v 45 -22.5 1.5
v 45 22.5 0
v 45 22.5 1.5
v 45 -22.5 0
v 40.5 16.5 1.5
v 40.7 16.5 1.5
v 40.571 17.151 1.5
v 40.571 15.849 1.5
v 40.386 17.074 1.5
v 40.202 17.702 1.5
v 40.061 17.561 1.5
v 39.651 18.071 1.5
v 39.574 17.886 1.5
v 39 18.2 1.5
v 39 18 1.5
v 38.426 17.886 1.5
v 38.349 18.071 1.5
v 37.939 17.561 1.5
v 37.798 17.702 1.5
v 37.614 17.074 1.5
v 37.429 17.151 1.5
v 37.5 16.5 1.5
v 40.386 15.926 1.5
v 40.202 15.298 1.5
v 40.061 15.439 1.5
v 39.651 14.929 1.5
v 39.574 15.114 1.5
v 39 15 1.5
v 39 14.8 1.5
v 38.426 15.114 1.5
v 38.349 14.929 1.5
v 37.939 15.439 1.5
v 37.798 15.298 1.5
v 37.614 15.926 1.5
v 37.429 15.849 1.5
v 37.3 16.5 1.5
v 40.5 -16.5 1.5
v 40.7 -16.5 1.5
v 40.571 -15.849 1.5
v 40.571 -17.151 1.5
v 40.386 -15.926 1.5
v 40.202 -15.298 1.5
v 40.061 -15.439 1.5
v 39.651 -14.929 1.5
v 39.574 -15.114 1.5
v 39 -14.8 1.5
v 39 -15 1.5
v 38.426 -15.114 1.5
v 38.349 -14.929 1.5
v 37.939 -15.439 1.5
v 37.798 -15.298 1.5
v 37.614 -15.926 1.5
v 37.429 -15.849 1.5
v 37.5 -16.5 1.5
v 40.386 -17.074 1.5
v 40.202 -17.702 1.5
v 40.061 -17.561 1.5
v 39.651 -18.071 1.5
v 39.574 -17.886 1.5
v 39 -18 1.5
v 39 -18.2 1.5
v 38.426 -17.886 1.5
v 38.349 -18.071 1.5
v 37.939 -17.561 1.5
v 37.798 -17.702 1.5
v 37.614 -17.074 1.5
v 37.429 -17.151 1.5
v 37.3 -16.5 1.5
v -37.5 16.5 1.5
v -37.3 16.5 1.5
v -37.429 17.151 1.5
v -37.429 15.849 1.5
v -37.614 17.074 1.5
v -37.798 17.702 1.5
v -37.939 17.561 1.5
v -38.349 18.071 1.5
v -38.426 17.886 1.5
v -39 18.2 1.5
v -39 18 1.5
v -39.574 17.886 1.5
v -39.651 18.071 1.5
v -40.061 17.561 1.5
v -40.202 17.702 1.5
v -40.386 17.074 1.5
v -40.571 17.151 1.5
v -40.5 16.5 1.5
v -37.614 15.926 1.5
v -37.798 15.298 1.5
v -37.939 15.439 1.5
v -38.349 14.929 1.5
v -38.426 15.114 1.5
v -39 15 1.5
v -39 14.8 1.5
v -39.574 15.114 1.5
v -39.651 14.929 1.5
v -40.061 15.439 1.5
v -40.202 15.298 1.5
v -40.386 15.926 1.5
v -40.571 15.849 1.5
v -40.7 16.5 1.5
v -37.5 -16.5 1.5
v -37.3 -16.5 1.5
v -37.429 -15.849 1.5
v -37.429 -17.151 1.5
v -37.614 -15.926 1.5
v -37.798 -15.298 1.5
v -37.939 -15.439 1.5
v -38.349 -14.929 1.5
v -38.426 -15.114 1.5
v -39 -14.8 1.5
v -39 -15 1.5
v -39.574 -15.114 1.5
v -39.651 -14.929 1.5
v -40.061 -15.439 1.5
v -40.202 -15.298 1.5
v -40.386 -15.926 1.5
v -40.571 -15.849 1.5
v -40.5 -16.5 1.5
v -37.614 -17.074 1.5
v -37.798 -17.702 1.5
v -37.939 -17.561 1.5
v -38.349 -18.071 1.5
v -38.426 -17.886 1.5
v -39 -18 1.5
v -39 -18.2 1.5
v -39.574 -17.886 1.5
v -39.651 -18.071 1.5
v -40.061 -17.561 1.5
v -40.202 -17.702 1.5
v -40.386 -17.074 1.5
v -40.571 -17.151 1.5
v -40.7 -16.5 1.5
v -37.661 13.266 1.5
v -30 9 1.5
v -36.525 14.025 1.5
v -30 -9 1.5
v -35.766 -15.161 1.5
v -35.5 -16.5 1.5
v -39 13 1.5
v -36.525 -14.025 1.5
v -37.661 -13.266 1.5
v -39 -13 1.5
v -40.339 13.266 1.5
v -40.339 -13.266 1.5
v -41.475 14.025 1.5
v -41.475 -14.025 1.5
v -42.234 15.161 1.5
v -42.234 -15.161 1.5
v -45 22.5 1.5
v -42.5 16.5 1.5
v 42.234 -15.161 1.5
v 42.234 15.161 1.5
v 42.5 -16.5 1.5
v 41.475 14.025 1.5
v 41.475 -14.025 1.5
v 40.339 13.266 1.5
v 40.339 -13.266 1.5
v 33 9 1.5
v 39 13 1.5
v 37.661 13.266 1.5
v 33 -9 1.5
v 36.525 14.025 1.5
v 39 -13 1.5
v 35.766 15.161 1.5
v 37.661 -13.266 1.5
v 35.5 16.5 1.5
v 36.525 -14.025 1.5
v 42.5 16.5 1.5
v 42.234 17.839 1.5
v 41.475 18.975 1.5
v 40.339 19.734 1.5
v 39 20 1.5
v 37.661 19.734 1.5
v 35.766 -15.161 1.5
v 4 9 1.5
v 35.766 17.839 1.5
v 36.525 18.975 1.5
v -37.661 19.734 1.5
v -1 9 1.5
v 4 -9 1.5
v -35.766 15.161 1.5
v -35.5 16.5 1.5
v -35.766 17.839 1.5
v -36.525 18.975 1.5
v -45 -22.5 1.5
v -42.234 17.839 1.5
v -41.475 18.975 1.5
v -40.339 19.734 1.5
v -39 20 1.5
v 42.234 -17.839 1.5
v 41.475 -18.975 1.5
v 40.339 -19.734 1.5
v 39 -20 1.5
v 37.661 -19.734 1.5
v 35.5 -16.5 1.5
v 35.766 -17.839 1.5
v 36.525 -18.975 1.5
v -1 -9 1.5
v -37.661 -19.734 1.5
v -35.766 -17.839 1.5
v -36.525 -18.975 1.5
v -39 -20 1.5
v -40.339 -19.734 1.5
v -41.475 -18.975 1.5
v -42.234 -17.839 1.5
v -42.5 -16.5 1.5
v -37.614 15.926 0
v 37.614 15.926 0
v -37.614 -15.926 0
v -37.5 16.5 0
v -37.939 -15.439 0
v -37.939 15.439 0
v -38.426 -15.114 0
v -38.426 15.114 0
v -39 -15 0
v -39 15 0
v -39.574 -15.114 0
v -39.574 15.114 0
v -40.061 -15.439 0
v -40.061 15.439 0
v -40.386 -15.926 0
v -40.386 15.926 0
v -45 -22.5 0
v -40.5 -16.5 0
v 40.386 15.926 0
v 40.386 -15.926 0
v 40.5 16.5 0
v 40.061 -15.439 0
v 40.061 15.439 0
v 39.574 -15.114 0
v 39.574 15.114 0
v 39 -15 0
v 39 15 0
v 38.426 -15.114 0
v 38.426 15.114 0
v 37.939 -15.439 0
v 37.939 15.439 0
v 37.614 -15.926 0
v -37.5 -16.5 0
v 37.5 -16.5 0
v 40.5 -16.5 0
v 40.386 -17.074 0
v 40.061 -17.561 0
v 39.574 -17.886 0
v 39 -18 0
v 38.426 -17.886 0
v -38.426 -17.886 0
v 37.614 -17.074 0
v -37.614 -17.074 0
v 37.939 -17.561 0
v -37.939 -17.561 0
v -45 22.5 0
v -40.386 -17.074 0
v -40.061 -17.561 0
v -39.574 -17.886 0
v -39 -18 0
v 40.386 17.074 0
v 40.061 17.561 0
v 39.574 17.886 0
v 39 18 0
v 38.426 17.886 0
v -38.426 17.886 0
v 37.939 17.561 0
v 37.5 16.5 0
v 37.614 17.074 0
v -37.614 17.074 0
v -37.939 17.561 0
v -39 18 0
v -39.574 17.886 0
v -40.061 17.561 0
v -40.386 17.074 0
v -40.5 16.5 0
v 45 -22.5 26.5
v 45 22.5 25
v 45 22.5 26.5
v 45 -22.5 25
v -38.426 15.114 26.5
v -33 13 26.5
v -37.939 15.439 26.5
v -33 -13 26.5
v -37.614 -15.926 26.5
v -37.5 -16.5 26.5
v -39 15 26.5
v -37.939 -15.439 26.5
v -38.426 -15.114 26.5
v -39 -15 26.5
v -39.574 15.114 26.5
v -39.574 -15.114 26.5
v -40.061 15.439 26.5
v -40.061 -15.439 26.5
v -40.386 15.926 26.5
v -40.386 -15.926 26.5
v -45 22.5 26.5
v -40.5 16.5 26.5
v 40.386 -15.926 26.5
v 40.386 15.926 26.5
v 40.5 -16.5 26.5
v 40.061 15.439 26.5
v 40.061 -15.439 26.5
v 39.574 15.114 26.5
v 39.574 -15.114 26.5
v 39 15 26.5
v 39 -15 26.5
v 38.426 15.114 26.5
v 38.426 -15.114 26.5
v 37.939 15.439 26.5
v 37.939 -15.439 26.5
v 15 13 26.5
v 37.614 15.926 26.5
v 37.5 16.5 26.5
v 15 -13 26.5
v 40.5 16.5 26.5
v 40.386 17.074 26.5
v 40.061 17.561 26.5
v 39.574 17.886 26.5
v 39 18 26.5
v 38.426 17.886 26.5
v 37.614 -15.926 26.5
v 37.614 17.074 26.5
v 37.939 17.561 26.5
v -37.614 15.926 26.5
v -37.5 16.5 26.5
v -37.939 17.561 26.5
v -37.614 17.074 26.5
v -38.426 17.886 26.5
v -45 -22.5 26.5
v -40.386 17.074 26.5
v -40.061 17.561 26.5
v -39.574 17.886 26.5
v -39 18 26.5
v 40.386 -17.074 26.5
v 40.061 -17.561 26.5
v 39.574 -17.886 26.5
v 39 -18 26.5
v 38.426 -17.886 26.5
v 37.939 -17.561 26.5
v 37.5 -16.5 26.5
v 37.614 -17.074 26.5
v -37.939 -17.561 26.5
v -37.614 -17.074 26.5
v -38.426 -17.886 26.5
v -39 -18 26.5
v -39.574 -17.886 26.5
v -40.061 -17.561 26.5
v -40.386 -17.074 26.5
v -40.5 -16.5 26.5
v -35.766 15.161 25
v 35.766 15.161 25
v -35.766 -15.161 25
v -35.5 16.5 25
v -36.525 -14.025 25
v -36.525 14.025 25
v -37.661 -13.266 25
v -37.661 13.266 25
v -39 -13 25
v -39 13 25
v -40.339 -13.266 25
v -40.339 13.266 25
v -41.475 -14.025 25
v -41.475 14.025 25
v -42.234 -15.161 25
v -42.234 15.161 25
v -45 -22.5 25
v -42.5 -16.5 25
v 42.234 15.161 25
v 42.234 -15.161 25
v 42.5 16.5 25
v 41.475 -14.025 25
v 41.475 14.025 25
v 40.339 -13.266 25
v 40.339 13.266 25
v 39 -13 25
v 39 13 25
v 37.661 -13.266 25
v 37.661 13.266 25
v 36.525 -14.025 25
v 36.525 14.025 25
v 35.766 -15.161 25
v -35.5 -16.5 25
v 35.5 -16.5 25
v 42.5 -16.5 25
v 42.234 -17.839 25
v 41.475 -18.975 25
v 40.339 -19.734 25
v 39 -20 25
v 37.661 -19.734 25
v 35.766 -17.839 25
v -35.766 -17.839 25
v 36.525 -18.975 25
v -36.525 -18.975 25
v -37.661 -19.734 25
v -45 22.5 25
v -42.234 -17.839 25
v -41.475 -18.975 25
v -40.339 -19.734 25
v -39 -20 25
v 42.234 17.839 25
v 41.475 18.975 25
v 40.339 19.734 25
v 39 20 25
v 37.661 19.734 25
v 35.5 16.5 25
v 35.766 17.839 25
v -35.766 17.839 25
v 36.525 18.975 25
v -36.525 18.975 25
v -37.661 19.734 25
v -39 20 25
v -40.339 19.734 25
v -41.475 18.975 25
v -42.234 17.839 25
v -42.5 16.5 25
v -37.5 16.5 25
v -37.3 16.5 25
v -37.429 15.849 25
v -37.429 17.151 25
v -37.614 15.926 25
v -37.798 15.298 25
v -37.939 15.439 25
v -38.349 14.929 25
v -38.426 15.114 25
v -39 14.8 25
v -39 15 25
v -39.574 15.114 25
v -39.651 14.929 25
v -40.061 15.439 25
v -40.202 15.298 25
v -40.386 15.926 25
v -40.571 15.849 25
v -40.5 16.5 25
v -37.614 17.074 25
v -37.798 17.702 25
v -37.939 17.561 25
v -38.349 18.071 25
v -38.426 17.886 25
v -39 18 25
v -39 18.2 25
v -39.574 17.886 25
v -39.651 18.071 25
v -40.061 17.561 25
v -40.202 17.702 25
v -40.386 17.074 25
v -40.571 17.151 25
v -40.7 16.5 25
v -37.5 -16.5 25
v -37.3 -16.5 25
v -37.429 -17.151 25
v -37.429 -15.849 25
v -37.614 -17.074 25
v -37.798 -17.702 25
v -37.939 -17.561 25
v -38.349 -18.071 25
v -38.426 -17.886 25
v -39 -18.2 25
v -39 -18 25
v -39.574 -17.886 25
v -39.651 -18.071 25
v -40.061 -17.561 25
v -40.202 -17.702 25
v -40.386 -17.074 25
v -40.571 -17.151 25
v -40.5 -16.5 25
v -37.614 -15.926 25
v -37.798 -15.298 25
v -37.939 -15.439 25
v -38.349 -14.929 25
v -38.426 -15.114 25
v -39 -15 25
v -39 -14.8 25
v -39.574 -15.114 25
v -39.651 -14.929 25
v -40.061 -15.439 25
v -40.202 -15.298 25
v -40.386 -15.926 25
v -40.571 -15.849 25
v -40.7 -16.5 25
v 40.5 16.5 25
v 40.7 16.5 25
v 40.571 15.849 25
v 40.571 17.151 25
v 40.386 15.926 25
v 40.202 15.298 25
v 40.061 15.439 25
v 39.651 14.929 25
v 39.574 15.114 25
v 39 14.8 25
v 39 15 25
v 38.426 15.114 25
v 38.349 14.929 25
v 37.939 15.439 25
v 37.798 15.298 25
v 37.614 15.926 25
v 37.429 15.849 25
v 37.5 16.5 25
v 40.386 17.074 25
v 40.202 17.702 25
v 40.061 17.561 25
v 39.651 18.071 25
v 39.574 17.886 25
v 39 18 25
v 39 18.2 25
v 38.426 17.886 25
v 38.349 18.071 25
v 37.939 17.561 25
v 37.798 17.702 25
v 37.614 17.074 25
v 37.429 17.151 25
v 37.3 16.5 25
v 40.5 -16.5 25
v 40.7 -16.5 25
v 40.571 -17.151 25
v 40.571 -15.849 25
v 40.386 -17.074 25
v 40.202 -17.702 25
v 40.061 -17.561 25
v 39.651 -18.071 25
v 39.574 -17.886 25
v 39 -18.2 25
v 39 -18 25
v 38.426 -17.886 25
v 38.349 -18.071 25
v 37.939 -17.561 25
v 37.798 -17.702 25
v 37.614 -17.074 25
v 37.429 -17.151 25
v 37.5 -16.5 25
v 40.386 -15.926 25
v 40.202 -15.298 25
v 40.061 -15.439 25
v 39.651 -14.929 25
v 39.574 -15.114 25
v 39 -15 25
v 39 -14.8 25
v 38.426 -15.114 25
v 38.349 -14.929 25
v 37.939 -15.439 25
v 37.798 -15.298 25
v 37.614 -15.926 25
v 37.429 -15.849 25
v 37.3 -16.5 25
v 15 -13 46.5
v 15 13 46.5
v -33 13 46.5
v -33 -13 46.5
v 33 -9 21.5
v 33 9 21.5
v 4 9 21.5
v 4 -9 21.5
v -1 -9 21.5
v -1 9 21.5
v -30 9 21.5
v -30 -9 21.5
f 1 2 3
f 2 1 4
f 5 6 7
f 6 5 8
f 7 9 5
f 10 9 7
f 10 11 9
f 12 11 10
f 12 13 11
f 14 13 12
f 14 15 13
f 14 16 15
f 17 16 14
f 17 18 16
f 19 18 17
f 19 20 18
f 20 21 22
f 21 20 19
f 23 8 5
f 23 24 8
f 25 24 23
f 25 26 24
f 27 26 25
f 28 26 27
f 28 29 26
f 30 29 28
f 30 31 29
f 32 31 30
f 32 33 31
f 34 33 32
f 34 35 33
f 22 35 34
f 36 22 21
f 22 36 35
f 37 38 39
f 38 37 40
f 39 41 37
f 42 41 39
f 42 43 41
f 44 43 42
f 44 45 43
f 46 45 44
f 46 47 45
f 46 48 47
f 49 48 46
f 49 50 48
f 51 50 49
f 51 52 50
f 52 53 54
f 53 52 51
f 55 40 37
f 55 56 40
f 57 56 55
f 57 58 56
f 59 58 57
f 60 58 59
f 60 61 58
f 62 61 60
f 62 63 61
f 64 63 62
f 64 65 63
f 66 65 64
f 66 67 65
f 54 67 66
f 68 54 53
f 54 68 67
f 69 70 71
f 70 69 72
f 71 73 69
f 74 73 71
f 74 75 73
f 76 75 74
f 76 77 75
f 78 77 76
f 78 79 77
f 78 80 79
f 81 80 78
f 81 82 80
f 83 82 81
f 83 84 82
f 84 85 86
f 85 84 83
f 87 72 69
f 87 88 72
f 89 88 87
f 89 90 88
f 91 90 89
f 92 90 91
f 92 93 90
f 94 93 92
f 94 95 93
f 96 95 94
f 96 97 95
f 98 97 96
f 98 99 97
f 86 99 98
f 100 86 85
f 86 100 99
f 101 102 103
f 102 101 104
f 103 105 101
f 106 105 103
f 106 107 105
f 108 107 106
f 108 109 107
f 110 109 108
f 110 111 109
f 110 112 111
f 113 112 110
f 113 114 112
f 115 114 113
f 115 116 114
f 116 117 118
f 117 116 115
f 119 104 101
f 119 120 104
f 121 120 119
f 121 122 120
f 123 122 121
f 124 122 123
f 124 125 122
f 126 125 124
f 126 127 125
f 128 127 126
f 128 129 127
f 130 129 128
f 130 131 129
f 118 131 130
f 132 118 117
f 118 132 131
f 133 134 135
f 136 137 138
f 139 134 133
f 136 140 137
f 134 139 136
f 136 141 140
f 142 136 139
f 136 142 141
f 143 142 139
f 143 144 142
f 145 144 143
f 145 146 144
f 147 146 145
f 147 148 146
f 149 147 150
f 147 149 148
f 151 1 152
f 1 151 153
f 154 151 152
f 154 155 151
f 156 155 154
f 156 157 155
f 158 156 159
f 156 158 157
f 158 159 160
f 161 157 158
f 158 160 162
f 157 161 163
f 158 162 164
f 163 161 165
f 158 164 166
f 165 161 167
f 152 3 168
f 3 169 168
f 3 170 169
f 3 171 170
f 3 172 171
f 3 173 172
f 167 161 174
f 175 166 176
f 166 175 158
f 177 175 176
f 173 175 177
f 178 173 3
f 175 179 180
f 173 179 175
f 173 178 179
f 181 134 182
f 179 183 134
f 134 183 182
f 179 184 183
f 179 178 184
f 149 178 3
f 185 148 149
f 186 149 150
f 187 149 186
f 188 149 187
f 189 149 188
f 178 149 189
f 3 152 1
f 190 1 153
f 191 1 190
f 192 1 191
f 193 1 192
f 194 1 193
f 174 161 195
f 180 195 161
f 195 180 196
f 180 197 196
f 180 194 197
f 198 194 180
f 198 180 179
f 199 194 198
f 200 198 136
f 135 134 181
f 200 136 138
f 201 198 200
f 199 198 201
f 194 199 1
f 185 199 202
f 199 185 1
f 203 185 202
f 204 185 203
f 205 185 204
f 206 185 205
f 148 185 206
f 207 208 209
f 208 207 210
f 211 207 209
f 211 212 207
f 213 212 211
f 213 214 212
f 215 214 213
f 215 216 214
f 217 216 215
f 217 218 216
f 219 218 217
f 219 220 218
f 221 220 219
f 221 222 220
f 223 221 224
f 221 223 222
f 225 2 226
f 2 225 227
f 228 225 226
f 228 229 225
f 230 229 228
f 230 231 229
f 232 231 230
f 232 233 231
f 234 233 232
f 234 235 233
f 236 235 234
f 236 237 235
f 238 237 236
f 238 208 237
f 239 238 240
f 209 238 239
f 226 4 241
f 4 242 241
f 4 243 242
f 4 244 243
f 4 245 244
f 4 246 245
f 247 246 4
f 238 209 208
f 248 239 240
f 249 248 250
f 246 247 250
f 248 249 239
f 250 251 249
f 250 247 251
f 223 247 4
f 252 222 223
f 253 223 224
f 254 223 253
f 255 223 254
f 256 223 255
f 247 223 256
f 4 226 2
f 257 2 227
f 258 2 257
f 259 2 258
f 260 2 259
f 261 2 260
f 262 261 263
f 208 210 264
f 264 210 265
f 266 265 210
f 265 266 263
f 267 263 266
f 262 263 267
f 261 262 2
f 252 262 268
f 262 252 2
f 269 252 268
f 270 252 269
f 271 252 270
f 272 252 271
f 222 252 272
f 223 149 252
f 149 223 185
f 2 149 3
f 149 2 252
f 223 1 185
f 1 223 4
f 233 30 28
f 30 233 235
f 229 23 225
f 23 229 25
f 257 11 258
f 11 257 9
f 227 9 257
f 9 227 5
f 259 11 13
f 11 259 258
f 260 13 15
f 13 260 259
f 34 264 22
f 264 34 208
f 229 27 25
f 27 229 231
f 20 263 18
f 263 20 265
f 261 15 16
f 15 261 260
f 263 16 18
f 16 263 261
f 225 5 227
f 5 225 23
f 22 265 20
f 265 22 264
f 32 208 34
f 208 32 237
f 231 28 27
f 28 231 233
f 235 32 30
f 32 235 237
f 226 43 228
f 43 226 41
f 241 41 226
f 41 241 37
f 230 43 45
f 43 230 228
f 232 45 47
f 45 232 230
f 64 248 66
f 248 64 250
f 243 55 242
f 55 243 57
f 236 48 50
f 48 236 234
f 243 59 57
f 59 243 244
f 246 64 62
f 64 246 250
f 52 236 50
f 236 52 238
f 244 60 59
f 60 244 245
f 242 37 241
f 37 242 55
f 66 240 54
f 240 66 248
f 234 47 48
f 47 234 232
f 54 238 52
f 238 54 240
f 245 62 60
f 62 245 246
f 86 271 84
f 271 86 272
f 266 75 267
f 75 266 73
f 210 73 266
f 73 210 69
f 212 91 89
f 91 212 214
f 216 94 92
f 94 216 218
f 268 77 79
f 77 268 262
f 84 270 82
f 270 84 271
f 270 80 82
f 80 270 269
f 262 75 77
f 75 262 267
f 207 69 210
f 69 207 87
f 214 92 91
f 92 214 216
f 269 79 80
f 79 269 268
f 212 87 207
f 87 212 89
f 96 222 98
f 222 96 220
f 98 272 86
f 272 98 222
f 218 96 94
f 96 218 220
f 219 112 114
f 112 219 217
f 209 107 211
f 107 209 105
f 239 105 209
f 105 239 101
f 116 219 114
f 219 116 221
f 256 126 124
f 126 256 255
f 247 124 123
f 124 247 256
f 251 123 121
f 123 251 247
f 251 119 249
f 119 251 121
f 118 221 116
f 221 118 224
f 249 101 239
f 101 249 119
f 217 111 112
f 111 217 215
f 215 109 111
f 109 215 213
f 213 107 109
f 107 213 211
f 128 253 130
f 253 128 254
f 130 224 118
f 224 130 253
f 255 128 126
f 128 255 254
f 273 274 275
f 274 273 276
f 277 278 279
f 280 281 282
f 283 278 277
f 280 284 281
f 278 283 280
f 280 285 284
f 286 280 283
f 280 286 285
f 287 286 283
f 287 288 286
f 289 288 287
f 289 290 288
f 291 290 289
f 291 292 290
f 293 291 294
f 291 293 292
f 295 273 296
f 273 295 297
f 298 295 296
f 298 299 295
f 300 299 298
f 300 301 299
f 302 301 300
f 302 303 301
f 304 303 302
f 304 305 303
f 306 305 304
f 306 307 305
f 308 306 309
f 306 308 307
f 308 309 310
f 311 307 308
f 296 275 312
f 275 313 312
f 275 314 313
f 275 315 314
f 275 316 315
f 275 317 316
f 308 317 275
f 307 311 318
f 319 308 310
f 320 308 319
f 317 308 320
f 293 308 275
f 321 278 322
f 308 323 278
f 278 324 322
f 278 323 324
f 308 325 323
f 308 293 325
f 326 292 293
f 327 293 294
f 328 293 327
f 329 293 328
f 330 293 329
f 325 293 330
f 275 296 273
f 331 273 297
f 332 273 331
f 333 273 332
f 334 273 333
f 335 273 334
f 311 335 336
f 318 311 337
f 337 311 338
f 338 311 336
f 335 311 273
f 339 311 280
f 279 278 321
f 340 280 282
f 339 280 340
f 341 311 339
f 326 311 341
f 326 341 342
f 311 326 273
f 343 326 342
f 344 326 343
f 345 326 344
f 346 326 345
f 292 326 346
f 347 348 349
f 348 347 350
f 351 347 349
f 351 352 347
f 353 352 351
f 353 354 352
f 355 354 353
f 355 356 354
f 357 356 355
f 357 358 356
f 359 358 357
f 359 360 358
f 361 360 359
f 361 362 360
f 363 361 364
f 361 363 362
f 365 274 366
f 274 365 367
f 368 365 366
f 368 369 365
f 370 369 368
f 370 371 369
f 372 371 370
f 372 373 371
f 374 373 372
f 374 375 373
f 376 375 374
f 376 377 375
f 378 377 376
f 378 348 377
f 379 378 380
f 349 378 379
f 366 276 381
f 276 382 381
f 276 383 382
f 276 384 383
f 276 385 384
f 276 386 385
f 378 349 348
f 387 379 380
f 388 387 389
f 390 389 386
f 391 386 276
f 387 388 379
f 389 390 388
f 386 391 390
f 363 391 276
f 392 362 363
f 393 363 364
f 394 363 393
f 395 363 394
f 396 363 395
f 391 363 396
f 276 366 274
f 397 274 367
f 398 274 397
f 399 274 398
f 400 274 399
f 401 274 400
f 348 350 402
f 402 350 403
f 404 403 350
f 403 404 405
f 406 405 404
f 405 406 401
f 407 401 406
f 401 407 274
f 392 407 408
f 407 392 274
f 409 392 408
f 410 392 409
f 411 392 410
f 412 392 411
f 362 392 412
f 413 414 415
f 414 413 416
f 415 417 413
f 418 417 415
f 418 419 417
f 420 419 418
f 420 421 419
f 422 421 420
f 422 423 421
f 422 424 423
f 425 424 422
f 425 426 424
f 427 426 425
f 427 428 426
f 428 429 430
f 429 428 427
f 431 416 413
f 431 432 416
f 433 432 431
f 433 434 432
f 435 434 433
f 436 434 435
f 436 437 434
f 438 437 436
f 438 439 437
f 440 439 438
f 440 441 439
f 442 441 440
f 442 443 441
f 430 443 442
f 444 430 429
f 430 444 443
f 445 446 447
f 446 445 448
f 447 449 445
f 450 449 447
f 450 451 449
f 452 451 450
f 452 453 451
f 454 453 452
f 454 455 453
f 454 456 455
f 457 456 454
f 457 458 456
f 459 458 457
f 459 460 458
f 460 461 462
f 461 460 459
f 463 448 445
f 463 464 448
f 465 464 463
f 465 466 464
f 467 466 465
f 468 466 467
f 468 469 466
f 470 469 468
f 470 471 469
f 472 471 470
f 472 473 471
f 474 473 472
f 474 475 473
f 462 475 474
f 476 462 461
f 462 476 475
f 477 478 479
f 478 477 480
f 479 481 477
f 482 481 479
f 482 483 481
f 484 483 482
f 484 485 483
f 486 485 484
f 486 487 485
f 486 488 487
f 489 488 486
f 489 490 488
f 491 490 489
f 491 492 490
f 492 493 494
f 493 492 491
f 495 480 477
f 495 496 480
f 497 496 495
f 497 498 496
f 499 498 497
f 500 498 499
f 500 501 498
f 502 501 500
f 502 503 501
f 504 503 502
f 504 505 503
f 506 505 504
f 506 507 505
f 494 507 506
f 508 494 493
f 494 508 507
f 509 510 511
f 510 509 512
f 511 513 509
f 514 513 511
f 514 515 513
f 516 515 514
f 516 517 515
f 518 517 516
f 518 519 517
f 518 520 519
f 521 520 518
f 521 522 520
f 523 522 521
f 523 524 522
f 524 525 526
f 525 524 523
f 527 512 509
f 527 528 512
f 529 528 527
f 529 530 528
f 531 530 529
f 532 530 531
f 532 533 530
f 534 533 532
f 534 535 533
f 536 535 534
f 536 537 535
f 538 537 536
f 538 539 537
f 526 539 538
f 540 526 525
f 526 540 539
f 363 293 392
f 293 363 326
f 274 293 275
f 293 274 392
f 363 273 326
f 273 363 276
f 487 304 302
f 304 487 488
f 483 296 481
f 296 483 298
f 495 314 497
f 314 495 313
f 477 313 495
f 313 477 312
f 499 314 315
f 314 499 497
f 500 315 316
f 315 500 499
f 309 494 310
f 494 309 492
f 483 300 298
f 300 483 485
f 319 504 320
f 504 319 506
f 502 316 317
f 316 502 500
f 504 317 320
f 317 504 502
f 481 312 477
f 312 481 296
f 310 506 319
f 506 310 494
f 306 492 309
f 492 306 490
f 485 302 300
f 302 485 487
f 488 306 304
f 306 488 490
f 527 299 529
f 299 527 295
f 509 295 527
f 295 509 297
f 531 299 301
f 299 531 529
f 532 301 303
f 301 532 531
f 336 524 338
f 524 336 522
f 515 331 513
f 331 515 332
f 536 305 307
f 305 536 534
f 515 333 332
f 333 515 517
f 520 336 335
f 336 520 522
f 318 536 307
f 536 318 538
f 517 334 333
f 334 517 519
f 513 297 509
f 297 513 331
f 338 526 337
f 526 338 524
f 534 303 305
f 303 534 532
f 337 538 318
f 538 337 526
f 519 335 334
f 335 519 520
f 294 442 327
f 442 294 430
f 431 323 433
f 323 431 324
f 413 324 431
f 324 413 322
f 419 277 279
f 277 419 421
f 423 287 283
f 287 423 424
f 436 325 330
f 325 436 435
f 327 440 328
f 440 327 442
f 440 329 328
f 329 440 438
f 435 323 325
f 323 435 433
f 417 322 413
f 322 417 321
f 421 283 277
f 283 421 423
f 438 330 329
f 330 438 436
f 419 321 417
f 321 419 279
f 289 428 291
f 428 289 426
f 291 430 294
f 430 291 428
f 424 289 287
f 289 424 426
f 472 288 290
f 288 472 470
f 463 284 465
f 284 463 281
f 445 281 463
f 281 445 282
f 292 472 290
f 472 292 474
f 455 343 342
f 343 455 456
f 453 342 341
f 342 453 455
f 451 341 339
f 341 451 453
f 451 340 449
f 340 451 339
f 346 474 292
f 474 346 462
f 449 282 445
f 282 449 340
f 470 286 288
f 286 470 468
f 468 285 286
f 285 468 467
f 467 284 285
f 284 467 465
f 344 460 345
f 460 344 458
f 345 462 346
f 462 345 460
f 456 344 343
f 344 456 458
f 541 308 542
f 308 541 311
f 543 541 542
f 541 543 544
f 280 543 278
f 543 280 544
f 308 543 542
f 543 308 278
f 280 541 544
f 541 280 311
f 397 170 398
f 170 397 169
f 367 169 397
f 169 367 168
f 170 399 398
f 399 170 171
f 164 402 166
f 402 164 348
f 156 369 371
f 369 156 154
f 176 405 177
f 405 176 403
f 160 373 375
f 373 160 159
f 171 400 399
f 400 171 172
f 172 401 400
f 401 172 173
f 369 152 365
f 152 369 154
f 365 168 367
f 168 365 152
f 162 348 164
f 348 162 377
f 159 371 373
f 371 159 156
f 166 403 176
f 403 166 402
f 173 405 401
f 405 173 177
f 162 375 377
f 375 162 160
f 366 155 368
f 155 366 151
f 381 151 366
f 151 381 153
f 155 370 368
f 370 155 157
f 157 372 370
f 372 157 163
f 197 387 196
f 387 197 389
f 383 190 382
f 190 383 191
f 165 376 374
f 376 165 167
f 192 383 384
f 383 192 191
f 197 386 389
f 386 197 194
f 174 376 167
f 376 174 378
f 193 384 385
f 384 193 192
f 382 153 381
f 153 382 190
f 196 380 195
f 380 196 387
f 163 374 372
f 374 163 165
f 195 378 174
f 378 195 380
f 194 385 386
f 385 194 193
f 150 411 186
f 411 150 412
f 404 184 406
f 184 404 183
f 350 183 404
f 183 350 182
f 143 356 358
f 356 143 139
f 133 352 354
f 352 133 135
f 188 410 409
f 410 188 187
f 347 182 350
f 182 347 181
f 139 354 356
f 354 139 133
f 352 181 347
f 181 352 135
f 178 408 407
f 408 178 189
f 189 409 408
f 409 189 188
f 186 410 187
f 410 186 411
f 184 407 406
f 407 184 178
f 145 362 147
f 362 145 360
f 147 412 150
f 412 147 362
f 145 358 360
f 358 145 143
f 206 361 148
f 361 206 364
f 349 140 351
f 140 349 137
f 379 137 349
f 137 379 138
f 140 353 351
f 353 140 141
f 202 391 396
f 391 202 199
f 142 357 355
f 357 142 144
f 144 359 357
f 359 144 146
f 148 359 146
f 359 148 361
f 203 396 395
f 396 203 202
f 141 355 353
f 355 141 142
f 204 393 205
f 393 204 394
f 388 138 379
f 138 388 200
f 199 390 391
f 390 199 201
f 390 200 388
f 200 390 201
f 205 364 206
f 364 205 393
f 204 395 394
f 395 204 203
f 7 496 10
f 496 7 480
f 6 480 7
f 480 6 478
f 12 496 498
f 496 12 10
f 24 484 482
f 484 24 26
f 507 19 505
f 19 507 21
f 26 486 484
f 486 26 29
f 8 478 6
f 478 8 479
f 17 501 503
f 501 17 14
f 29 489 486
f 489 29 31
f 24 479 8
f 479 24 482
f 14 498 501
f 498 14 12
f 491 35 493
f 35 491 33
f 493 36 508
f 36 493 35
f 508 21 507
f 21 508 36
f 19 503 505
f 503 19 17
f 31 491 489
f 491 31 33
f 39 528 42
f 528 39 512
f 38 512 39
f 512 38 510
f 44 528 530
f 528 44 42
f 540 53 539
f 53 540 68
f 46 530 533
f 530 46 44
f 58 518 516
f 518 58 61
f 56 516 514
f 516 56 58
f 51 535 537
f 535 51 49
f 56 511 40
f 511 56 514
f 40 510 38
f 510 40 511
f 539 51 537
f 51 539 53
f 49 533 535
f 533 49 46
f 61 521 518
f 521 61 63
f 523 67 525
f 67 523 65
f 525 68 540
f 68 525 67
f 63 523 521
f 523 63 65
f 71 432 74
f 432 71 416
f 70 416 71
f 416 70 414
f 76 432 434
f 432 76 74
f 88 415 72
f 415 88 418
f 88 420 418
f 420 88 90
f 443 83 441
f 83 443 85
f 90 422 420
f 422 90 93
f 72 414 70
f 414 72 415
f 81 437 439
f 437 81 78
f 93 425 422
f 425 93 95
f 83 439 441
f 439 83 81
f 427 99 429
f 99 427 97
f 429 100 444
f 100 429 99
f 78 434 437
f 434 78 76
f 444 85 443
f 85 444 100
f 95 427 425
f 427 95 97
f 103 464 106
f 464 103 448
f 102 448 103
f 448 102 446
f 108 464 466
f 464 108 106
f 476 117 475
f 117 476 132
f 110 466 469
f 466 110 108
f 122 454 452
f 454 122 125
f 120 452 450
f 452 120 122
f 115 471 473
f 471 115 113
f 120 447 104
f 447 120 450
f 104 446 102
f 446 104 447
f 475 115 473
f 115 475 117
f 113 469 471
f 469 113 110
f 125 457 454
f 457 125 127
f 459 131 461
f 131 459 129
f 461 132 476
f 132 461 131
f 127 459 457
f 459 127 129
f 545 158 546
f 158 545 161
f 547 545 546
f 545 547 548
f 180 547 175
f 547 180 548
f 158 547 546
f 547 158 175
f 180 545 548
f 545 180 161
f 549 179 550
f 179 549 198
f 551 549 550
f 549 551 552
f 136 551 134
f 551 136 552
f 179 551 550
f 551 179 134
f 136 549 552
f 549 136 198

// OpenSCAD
board_height=1.5;
hole=3;
size=2;

module elecboard(width,deep,security=0) {
    difference() {
        translate([0,0,board_height/2]) cube([width+2*security,deep+2*security,board_height],true);
        translate([width/2-2*hole,deep/2-2*hole,0]) cylinder(board_height,d=hole,$fn=16);
        translate([width/2-2*hole,-deep/2+2*hole,0]) cylinder(board_height,d=hole,$fn=16);
        translate([-width/2+2*hole,deep/2-2*hole,0]) cylinder(board_height,d=hole,$fn=16);
        translate([-width/2+2*hole,-deep/2+2*hole,0]) cylinder(board_height,d=hole,$fn=16);
    }
}

module entretoises(width,deep,height, security=0) {
    difference() {
        union() {
            translate([width/2-2*hole,deep/2-2*hole,0]) cylinder(height,d=hole+2*size,$fn=16);
            translate([width/2-2*hole,-deep/2+2*hole,0]) cylinder(height,d=hole+2*size,$fn=16);
            translate([-width/2+2*hole,deep/2-2*hole,0]) cylinder(height,d=hole+2*size,$fn=16);
            translate([-width/2+2*hole,-deep/2+2*hole,0]) cylinder(height,d=hole+2*size,$fn=16);
        }
        translate([width/2-2*hole,deep/2-2*hole,0]) cylinder(height,d=hole+2*security,$fn=16);
        translate([width/2-2*hole,-deep/2+2*hole,0]) cylinder(height,d=hole+2*security,$fn=16);
        translate([-width/2+2*hole,deep/2-2*hole,0]) cylinder(height,d=hole+2*security,$fn=16);
        translate([-width/2+2*hole,-deep/2+2*hole,0]) cylinder(height,d=hole+2*security,$fn=16);
    }
}


module board_screw(width,deep,height, security=0) {
    translate([width/2-2*hole,deep/2-2*hole,0]) cylinder(height,d=hole+2*security,$fn=16);
    translate([width/2-2*hole,-deep/2+2*hole,0]) cylinder(height,d=hole+2*security,$fn=16);
    translate([-width/2+2*hole,deep/2-2*hole,0]) cylinder(height,d=hole+2*security,$fn=16);
    translate([-width/2+2*hole,-deep/2+2*hole,0]) cylinder(height,d=hole+2*security,$fn=16);
}
module esp8266() {
    width=48;
    deep=26;
    height=20;
    translate([0,0,height/2]) cube([width,deep,height],true);
}

module dac() {
    width=29;
    deep=18;
    height=20;
    translate([0,0,height/2]) cube([width,deep,height],true);
}

module shift_register() {
    width=29;
    deep=35;
    height=20;
    translate([0,0,height/2]) cube([width,deep,height],true);
}


module board_esp8266(width,deep,security=0) {
    elecboard(width,deep,security);
    translate([-(width-48)/2+4*hole,0,board_height]) esp8266();
}


module board_dac(width,deep,security=0) {
    elecboard(width,deep,security);
    translate([(width-29)/2-4*hole,0,board_height]) dac();
    translate([(-width+35)/2+4*hole,0,board_height]) dac();
}

module boards(width,deep,security=0.2) {
    translate([0,0,25]) board_esp8266(width,deep);
    translate([0,0,board_height]) entretoises(width,deep,25,security);
    board_dac(width,deep);
}

boards(90,45);
